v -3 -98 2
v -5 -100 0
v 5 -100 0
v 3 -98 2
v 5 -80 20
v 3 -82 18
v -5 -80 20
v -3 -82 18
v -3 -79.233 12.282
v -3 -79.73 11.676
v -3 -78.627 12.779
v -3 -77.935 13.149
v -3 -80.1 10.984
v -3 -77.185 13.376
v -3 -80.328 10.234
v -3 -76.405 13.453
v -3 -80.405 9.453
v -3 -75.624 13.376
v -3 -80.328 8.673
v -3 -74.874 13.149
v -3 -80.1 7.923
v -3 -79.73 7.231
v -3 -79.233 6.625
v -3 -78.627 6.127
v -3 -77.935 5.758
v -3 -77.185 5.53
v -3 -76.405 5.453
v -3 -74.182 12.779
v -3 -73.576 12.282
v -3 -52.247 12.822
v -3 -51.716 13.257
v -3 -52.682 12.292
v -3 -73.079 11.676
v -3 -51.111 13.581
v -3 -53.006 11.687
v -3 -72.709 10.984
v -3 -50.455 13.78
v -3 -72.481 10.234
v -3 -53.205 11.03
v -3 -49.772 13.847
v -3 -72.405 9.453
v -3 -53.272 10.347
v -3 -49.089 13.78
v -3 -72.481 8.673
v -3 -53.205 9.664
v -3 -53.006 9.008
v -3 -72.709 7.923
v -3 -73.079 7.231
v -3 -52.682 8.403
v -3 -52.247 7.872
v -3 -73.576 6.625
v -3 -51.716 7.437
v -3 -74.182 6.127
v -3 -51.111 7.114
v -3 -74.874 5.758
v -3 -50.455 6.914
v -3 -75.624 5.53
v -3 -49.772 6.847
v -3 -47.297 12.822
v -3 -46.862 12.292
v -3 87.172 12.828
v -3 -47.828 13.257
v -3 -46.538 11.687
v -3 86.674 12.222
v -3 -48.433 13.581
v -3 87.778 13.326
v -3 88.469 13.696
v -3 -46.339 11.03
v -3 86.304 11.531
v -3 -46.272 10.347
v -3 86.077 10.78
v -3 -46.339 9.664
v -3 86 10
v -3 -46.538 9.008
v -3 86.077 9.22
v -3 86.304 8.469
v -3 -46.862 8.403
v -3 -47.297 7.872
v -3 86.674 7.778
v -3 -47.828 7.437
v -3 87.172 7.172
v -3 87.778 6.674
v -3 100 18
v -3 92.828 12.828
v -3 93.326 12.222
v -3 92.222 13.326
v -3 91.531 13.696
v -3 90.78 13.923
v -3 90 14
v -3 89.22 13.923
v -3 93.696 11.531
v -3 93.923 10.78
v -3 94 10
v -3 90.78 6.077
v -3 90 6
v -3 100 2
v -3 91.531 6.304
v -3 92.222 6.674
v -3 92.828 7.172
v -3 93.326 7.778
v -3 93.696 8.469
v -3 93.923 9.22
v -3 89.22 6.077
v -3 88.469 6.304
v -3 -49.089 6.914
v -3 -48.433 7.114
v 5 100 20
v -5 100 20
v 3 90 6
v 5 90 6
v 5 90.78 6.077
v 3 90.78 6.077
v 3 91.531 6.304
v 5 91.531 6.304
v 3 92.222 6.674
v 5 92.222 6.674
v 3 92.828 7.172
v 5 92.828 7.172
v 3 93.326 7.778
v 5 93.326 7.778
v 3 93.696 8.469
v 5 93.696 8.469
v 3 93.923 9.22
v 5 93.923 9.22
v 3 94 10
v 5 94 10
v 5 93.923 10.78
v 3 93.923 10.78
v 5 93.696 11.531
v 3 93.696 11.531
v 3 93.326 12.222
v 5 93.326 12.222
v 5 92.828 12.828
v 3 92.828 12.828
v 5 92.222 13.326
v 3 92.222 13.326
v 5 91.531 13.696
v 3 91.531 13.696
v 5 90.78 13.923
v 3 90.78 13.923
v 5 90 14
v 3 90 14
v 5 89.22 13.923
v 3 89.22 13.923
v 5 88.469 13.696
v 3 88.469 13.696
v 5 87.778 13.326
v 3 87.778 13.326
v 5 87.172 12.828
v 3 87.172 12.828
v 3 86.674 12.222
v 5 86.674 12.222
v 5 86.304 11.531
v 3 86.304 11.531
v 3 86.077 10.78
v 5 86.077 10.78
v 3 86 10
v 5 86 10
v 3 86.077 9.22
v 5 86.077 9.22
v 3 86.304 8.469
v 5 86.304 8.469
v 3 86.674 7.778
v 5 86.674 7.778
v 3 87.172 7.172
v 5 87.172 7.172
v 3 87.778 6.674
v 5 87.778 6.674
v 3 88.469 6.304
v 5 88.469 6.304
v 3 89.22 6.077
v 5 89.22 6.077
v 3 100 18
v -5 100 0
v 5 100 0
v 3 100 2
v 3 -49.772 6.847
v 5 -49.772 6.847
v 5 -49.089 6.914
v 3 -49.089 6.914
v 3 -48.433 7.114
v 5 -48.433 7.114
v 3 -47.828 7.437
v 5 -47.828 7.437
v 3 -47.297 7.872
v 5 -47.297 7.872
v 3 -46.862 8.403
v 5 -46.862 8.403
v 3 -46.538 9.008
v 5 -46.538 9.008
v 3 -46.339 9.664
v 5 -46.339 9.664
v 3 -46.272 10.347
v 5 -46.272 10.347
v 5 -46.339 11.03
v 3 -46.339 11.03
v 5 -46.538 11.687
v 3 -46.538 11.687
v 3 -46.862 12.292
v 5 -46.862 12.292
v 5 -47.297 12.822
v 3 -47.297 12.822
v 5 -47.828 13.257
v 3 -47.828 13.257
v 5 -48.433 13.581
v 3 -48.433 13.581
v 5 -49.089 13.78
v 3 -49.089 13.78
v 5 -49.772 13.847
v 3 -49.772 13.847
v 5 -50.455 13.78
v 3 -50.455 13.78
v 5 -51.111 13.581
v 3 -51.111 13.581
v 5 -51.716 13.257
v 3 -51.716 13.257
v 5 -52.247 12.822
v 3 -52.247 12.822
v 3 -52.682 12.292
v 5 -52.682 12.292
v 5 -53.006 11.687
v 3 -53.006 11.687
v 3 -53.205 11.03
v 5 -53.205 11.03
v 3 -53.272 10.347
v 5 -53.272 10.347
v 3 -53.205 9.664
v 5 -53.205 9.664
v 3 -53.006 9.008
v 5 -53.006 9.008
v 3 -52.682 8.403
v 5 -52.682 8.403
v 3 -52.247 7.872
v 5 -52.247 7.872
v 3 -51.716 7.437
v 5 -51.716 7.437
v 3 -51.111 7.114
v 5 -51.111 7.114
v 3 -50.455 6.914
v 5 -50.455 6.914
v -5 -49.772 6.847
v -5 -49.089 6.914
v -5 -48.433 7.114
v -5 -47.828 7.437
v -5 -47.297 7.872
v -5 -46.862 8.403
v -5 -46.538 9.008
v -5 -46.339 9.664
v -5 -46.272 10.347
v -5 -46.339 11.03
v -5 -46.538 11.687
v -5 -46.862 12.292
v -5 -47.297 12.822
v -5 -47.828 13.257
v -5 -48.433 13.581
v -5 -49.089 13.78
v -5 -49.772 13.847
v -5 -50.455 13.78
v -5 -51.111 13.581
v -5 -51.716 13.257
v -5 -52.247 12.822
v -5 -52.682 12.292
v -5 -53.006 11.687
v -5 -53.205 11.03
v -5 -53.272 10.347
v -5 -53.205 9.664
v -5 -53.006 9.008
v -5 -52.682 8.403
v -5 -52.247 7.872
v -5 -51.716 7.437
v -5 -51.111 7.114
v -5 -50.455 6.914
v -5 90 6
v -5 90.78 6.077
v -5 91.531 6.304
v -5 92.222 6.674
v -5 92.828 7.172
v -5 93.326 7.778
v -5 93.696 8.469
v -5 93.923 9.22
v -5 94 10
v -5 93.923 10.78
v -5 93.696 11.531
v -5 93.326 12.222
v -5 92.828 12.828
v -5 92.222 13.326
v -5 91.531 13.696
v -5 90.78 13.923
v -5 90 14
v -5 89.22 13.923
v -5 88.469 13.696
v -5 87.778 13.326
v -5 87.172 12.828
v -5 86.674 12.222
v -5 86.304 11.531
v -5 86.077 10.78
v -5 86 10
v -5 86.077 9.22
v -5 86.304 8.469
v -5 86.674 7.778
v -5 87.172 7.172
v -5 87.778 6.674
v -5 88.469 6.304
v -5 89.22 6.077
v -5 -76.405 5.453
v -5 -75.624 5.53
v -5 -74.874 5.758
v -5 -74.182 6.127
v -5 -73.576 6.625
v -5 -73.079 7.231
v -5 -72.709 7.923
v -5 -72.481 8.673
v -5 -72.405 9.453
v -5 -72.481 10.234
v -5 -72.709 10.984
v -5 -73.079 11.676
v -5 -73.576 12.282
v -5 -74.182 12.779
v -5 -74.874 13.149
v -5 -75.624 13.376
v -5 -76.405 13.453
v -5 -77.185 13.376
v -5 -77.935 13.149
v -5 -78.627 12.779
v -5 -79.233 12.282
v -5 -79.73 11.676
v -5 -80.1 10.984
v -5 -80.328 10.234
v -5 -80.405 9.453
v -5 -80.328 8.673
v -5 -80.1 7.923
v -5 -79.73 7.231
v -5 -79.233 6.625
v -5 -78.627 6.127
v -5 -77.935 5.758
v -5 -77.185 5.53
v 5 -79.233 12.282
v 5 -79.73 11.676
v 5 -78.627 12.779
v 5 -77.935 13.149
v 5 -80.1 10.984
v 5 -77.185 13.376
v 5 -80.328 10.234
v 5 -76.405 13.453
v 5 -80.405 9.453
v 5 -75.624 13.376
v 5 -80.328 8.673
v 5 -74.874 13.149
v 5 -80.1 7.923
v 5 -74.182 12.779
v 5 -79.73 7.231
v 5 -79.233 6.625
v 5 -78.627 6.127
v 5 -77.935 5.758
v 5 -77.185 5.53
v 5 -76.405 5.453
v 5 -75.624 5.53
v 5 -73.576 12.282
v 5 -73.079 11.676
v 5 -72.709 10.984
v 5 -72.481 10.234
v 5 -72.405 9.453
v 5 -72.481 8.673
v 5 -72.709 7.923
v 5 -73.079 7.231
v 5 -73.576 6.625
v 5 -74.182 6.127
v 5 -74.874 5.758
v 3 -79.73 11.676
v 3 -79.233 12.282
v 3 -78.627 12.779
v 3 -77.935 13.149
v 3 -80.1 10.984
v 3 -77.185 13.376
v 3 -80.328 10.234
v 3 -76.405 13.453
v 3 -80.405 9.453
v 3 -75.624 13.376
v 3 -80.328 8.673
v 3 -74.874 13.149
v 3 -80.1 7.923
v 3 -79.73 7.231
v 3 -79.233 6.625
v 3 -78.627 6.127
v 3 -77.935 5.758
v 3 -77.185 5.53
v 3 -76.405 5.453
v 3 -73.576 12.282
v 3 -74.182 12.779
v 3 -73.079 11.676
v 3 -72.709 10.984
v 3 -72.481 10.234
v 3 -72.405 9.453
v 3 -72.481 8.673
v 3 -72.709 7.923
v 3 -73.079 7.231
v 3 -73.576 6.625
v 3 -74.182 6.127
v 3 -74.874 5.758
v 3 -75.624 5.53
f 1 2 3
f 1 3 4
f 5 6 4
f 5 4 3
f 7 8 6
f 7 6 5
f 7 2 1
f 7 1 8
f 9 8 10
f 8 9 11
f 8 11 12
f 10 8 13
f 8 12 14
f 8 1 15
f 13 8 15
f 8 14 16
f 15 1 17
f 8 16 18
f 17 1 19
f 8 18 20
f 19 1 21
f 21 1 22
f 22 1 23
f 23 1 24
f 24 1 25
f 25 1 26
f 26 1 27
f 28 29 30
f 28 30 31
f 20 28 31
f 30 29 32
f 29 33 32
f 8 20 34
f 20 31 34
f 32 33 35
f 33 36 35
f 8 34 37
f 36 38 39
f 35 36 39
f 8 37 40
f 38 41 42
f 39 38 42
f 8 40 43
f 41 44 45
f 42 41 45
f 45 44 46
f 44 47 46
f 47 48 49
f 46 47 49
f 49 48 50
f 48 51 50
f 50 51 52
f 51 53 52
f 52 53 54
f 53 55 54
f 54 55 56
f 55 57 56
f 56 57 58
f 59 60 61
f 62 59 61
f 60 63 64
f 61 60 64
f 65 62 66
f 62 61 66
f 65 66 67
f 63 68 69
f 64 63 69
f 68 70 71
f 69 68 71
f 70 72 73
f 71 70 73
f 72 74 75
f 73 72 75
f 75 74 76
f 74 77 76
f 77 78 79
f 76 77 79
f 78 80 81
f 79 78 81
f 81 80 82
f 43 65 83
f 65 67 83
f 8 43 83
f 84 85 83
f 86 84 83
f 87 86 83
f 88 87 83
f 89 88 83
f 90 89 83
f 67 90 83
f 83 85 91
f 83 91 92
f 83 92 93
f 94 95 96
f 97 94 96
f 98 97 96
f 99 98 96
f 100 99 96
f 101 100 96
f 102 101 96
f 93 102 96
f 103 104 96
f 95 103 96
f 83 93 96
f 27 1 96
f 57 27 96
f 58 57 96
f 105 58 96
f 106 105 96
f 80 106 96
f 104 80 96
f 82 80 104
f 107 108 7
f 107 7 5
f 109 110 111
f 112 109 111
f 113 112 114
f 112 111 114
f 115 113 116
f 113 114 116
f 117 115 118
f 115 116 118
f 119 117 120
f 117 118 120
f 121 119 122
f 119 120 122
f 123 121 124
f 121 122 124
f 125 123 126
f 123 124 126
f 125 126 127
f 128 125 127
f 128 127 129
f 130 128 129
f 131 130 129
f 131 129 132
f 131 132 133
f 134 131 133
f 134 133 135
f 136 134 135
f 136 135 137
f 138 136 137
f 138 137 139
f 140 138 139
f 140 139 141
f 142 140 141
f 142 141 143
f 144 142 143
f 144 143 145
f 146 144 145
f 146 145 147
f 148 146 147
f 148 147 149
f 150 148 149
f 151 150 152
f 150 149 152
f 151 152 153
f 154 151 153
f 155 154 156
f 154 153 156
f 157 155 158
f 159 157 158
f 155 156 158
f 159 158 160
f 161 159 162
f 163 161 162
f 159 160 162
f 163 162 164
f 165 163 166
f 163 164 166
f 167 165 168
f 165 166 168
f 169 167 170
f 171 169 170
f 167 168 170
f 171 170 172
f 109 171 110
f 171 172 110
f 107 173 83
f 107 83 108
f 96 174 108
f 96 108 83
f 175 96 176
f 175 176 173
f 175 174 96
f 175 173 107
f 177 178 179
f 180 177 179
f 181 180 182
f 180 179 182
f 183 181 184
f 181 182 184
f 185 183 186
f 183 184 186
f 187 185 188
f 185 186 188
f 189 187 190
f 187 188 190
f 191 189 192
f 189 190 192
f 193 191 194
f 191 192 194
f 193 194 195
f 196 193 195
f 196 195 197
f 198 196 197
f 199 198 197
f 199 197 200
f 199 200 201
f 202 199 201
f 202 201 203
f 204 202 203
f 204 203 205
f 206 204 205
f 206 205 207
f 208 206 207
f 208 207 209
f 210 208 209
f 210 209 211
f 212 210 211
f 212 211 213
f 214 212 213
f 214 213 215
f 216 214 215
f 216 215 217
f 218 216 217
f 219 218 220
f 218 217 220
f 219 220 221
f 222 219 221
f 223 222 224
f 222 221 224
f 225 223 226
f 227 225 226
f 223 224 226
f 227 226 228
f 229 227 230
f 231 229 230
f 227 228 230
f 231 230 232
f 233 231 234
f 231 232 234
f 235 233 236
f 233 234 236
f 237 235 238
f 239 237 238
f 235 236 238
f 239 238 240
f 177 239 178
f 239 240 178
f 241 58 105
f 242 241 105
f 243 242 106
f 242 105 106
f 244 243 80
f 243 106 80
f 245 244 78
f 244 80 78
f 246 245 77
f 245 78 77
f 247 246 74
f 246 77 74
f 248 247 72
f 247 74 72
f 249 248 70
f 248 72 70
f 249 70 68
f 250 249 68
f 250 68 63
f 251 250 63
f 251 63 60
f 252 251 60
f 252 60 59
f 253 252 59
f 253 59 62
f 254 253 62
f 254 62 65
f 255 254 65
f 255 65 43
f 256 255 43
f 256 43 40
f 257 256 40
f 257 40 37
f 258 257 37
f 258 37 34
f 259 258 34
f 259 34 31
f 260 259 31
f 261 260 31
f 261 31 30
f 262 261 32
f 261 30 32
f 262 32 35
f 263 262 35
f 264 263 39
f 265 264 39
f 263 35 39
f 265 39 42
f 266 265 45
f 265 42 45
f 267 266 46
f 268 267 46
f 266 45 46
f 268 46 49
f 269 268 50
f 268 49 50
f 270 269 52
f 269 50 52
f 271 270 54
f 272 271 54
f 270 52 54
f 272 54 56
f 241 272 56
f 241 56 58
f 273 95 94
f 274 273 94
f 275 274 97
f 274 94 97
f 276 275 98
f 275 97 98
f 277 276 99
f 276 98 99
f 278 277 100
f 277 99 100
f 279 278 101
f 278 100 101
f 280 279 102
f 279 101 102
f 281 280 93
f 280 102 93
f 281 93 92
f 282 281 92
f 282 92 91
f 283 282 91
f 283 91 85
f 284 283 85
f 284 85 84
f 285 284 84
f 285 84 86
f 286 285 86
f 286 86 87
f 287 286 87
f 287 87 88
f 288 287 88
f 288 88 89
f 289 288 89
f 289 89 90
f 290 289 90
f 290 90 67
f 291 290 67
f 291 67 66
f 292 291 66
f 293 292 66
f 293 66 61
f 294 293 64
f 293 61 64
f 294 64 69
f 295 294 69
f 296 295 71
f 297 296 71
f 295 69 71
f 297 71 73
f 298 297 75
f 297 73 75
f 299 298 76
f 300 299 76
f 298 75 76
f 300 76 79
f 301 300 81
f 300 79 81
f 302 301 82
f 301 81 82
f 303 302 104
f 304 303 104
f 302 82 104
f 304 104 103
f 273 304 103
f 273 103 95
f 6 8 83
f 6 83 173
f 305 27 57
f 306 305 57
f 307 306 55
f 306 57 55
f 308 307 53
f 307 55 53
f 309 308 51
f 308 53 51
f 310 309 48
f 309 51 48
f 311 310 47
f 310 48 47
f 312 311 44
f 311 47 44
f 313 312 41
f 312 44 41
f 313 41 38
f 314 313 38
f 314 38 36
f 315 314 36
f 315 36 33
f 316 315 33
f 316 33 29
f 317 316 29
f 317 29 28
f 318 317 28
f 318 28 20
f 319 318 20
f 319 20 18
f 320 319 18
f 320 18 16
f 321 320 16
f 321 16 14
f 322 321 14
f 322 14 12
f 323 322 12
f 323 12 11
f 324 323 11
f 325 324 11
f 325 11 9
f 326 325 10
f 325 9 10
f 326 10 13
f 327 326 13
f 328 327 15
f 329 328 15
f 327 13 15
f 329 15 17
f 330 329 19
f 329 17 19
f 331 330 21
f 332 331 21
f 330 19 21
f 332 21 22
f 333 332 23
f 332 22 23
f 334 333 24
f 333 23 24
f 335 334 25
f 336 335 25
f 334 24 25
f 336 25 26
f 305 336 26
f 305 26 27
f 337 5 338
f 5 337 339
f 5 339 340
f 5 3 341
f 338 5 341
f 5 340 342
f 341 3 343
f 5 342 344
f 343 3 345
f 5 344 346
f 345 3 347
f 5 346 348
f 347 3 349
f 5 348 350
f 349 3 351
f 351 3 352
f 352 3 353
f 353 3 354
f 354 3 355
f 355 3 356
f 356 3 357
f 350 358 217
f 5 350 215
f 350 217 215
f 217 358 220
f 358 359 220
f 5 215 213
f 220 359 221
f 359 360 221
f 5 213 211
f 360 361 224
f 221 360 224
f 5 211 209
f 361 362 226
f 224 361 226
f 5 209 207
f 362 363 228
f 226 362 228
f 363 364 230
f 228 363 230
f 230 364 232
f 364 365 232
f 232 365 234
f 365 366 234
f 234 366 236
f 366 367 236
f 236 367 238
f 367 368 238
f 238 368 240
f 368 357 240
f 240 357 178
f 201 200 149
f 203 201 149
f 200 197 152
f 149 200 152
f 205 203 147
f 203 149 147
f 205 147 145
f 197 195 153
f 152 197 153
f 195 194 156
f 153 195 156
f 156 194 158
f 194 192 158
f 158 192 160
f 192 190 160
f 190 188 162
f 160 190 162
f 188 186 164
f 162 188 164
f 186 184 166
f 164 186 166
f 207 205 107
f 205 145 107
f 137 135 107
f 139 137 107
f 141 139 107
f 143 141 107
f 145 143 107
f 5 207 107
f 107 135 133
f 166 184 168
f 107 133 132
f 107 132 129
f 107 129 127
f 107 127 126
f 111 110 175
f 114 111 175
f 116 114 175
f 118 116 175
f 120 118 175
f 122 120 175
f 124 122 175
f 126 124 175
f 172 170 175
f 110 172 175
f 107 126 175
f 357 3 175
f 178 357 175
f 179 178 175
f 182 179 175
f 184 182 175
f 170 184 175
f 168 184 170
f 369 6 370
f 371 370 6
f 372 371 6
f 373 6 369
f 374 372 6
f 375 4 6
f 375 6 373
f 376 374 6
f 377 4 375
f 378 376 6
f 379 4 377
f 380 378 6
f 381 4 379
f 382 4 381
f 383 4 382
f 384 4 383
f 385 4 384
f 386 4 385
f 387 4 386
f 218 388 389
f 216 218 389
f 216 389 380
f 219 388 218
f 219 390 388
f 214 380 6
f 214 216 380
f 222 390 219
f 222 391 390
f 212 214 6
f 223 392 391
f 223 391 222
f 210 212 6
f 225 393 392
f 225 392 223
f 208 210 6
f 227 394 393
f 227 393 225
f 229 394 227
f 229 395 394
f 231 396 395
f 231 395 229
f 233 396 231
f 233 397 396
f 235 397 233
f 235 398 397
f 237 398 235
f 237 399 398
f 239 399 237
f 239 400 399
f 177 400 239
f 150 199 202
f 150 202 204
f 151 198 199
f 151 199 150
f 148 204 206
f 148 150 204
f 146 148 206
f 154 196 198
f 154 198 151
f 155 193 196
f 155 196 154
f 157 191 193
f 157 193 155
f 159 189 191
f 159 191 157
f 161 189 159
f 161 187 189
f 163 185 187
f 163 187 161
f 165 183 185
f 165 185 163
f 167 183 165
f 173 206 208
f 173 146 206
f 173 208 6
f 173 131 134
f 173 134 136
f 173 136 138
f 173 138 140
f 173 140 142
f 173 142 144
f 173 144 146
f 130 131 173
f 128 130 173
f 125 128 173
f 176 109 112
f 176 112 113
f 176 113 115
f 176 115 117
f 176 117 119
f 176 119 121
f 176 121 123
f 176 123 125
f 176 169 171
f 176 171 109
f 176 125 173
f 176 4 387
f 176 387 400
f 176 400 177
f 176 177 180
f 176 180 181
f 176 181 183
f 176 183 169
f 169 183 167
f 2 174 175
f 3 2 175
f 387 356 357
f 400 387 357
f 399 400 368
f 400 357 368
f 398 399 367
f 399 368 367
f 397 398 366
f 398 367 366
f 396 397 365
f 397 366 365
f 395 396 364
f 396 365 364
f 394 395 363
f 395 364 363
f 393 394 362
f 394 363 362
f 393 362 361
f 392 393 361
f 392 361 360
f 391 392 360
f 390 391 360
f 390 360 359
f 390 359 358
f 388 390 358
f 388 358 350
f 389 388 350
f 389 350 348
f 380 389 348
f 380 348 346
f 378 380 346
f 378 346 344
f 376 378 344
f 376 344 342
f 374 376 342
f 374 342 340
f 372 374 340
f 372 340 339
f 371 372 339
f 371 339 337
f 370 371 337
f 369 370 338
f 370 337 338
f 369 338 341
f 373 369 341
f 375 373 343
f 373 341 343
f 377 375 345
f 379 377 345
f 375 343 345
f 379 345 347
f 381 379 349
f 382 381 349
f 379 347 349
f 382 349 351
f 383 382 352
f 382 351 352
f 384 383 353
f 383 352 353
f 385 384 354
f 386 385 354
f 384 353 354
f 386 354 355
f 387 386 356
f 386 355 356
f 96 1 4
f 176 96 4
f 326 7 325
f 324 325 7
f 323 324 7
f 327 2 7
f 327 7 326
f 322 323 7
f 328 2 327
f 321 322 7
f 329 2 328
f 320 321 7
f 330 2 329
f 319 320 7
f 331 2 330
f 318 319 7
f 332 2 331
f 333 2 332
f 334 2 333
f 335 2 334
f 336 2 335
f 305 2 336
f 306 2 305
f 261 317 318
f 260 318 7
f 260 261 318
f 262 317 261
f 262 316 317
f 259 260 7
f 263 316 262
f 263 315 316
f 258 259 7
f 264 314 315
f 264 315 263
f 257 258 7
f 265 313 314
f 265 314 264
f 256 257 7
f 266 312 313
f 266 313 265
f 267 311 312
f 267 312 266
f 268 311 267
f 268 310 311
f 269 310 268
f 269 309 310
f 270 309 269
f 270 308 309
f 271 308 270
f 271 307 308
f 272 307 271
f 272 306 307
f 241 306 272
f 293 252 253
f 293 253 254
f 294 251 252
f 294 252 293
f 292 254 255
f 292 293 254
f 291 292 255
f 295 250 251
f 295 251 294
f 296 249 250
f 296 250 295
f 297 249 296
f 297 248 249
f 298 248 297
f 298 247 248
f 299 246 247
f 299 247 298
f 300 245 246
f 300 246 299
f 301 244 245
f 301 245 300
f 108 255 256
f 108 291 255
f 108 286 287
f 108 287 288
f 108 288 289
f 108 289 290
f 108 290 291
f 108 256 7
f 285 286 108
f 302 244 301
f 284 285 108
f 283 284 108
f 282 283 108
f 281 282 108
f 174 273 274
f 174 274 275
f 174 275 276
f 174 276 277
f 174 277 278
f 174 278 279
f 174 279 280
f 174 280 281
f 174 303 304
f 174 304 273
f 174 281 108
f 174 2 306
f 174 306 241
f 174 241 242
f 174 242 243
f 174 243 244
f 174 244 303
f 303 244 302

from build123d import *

# Parameters (mm, degrees)
SKETCH1_W           = 10
SKETCH1_H           = 200
BOSS_EXTRUDE1_DEPTH = 20
SHELL1_T            = -2
CUT_EXTRUDE1_DEPTH  = 10
SKETCH4_R           = 4
CUT_EXTRUDE3_DEPTH  = 10
SKETCH5_R           = 4
SKETCH5_R_2         = 3.5
CUT_EXTRUDE4_DEPTH  = 10


with BuildPart() as part:
    # Sketch1 → Boss-Extrude1 (new body)
    with BuildSketch(Plane.XY):
        Rectangle(SKETCH1_W, SKETCH1_H)
    extrude(amount=BOSS_EXTRUDE1_DEPTH)

    # Shell1
    shell1_openings = [part.faces().sort_by_distance(p)[0] for p in [
        (0, 100, 10),
        (0, -100, 10),
    ]]
    offset(amount=SHELL1_T, openings=shell1_openings, kind=Kind.INTERSECTION)

    # Sketch2 → Cut-Extrude1 (cut)
    with BuildSketch(Plane.ZY.offset(5)):
        Polygon((0, -100), (20, -80), (20, -100), align=None)
    extrude(amount=-CUT_EXTRUDE1_DEPTH, mode=Mode.SUBTRACT)

    # Sketch4 → Cut-Extrude3 (cut)
    with BuildSketch(Plane(origin=(5, 0, 0), x_dir=(0, 0, -1), z_dir=(1, 0, 0))):
        with Locations((-10, 90)):
            Circle(SKETCH4_R)
    extrude(amount=-CUT_EXTRUDE3_DEPTH, mode=Mode.SUBTRACT)

    # Sketch5 → Cut-Extrude4 (cut)
    with BuildSketch(Plane(origin=(5, 0, 0), x_dir=(0, 0, -1), z_dir=(1, 0, 0))):
        with Locations((-9.453331646, -76.40453273)):
            Circle(SKETCH5_R)
        with Locations((-10.347176909, -49.772000632)):
            Circle(SKETCH5_R_2)
    extrude(amount=-CUT_EXTRUDE4_DEPTH, mode=Mode.SUBTRACT)


solid = part.part
